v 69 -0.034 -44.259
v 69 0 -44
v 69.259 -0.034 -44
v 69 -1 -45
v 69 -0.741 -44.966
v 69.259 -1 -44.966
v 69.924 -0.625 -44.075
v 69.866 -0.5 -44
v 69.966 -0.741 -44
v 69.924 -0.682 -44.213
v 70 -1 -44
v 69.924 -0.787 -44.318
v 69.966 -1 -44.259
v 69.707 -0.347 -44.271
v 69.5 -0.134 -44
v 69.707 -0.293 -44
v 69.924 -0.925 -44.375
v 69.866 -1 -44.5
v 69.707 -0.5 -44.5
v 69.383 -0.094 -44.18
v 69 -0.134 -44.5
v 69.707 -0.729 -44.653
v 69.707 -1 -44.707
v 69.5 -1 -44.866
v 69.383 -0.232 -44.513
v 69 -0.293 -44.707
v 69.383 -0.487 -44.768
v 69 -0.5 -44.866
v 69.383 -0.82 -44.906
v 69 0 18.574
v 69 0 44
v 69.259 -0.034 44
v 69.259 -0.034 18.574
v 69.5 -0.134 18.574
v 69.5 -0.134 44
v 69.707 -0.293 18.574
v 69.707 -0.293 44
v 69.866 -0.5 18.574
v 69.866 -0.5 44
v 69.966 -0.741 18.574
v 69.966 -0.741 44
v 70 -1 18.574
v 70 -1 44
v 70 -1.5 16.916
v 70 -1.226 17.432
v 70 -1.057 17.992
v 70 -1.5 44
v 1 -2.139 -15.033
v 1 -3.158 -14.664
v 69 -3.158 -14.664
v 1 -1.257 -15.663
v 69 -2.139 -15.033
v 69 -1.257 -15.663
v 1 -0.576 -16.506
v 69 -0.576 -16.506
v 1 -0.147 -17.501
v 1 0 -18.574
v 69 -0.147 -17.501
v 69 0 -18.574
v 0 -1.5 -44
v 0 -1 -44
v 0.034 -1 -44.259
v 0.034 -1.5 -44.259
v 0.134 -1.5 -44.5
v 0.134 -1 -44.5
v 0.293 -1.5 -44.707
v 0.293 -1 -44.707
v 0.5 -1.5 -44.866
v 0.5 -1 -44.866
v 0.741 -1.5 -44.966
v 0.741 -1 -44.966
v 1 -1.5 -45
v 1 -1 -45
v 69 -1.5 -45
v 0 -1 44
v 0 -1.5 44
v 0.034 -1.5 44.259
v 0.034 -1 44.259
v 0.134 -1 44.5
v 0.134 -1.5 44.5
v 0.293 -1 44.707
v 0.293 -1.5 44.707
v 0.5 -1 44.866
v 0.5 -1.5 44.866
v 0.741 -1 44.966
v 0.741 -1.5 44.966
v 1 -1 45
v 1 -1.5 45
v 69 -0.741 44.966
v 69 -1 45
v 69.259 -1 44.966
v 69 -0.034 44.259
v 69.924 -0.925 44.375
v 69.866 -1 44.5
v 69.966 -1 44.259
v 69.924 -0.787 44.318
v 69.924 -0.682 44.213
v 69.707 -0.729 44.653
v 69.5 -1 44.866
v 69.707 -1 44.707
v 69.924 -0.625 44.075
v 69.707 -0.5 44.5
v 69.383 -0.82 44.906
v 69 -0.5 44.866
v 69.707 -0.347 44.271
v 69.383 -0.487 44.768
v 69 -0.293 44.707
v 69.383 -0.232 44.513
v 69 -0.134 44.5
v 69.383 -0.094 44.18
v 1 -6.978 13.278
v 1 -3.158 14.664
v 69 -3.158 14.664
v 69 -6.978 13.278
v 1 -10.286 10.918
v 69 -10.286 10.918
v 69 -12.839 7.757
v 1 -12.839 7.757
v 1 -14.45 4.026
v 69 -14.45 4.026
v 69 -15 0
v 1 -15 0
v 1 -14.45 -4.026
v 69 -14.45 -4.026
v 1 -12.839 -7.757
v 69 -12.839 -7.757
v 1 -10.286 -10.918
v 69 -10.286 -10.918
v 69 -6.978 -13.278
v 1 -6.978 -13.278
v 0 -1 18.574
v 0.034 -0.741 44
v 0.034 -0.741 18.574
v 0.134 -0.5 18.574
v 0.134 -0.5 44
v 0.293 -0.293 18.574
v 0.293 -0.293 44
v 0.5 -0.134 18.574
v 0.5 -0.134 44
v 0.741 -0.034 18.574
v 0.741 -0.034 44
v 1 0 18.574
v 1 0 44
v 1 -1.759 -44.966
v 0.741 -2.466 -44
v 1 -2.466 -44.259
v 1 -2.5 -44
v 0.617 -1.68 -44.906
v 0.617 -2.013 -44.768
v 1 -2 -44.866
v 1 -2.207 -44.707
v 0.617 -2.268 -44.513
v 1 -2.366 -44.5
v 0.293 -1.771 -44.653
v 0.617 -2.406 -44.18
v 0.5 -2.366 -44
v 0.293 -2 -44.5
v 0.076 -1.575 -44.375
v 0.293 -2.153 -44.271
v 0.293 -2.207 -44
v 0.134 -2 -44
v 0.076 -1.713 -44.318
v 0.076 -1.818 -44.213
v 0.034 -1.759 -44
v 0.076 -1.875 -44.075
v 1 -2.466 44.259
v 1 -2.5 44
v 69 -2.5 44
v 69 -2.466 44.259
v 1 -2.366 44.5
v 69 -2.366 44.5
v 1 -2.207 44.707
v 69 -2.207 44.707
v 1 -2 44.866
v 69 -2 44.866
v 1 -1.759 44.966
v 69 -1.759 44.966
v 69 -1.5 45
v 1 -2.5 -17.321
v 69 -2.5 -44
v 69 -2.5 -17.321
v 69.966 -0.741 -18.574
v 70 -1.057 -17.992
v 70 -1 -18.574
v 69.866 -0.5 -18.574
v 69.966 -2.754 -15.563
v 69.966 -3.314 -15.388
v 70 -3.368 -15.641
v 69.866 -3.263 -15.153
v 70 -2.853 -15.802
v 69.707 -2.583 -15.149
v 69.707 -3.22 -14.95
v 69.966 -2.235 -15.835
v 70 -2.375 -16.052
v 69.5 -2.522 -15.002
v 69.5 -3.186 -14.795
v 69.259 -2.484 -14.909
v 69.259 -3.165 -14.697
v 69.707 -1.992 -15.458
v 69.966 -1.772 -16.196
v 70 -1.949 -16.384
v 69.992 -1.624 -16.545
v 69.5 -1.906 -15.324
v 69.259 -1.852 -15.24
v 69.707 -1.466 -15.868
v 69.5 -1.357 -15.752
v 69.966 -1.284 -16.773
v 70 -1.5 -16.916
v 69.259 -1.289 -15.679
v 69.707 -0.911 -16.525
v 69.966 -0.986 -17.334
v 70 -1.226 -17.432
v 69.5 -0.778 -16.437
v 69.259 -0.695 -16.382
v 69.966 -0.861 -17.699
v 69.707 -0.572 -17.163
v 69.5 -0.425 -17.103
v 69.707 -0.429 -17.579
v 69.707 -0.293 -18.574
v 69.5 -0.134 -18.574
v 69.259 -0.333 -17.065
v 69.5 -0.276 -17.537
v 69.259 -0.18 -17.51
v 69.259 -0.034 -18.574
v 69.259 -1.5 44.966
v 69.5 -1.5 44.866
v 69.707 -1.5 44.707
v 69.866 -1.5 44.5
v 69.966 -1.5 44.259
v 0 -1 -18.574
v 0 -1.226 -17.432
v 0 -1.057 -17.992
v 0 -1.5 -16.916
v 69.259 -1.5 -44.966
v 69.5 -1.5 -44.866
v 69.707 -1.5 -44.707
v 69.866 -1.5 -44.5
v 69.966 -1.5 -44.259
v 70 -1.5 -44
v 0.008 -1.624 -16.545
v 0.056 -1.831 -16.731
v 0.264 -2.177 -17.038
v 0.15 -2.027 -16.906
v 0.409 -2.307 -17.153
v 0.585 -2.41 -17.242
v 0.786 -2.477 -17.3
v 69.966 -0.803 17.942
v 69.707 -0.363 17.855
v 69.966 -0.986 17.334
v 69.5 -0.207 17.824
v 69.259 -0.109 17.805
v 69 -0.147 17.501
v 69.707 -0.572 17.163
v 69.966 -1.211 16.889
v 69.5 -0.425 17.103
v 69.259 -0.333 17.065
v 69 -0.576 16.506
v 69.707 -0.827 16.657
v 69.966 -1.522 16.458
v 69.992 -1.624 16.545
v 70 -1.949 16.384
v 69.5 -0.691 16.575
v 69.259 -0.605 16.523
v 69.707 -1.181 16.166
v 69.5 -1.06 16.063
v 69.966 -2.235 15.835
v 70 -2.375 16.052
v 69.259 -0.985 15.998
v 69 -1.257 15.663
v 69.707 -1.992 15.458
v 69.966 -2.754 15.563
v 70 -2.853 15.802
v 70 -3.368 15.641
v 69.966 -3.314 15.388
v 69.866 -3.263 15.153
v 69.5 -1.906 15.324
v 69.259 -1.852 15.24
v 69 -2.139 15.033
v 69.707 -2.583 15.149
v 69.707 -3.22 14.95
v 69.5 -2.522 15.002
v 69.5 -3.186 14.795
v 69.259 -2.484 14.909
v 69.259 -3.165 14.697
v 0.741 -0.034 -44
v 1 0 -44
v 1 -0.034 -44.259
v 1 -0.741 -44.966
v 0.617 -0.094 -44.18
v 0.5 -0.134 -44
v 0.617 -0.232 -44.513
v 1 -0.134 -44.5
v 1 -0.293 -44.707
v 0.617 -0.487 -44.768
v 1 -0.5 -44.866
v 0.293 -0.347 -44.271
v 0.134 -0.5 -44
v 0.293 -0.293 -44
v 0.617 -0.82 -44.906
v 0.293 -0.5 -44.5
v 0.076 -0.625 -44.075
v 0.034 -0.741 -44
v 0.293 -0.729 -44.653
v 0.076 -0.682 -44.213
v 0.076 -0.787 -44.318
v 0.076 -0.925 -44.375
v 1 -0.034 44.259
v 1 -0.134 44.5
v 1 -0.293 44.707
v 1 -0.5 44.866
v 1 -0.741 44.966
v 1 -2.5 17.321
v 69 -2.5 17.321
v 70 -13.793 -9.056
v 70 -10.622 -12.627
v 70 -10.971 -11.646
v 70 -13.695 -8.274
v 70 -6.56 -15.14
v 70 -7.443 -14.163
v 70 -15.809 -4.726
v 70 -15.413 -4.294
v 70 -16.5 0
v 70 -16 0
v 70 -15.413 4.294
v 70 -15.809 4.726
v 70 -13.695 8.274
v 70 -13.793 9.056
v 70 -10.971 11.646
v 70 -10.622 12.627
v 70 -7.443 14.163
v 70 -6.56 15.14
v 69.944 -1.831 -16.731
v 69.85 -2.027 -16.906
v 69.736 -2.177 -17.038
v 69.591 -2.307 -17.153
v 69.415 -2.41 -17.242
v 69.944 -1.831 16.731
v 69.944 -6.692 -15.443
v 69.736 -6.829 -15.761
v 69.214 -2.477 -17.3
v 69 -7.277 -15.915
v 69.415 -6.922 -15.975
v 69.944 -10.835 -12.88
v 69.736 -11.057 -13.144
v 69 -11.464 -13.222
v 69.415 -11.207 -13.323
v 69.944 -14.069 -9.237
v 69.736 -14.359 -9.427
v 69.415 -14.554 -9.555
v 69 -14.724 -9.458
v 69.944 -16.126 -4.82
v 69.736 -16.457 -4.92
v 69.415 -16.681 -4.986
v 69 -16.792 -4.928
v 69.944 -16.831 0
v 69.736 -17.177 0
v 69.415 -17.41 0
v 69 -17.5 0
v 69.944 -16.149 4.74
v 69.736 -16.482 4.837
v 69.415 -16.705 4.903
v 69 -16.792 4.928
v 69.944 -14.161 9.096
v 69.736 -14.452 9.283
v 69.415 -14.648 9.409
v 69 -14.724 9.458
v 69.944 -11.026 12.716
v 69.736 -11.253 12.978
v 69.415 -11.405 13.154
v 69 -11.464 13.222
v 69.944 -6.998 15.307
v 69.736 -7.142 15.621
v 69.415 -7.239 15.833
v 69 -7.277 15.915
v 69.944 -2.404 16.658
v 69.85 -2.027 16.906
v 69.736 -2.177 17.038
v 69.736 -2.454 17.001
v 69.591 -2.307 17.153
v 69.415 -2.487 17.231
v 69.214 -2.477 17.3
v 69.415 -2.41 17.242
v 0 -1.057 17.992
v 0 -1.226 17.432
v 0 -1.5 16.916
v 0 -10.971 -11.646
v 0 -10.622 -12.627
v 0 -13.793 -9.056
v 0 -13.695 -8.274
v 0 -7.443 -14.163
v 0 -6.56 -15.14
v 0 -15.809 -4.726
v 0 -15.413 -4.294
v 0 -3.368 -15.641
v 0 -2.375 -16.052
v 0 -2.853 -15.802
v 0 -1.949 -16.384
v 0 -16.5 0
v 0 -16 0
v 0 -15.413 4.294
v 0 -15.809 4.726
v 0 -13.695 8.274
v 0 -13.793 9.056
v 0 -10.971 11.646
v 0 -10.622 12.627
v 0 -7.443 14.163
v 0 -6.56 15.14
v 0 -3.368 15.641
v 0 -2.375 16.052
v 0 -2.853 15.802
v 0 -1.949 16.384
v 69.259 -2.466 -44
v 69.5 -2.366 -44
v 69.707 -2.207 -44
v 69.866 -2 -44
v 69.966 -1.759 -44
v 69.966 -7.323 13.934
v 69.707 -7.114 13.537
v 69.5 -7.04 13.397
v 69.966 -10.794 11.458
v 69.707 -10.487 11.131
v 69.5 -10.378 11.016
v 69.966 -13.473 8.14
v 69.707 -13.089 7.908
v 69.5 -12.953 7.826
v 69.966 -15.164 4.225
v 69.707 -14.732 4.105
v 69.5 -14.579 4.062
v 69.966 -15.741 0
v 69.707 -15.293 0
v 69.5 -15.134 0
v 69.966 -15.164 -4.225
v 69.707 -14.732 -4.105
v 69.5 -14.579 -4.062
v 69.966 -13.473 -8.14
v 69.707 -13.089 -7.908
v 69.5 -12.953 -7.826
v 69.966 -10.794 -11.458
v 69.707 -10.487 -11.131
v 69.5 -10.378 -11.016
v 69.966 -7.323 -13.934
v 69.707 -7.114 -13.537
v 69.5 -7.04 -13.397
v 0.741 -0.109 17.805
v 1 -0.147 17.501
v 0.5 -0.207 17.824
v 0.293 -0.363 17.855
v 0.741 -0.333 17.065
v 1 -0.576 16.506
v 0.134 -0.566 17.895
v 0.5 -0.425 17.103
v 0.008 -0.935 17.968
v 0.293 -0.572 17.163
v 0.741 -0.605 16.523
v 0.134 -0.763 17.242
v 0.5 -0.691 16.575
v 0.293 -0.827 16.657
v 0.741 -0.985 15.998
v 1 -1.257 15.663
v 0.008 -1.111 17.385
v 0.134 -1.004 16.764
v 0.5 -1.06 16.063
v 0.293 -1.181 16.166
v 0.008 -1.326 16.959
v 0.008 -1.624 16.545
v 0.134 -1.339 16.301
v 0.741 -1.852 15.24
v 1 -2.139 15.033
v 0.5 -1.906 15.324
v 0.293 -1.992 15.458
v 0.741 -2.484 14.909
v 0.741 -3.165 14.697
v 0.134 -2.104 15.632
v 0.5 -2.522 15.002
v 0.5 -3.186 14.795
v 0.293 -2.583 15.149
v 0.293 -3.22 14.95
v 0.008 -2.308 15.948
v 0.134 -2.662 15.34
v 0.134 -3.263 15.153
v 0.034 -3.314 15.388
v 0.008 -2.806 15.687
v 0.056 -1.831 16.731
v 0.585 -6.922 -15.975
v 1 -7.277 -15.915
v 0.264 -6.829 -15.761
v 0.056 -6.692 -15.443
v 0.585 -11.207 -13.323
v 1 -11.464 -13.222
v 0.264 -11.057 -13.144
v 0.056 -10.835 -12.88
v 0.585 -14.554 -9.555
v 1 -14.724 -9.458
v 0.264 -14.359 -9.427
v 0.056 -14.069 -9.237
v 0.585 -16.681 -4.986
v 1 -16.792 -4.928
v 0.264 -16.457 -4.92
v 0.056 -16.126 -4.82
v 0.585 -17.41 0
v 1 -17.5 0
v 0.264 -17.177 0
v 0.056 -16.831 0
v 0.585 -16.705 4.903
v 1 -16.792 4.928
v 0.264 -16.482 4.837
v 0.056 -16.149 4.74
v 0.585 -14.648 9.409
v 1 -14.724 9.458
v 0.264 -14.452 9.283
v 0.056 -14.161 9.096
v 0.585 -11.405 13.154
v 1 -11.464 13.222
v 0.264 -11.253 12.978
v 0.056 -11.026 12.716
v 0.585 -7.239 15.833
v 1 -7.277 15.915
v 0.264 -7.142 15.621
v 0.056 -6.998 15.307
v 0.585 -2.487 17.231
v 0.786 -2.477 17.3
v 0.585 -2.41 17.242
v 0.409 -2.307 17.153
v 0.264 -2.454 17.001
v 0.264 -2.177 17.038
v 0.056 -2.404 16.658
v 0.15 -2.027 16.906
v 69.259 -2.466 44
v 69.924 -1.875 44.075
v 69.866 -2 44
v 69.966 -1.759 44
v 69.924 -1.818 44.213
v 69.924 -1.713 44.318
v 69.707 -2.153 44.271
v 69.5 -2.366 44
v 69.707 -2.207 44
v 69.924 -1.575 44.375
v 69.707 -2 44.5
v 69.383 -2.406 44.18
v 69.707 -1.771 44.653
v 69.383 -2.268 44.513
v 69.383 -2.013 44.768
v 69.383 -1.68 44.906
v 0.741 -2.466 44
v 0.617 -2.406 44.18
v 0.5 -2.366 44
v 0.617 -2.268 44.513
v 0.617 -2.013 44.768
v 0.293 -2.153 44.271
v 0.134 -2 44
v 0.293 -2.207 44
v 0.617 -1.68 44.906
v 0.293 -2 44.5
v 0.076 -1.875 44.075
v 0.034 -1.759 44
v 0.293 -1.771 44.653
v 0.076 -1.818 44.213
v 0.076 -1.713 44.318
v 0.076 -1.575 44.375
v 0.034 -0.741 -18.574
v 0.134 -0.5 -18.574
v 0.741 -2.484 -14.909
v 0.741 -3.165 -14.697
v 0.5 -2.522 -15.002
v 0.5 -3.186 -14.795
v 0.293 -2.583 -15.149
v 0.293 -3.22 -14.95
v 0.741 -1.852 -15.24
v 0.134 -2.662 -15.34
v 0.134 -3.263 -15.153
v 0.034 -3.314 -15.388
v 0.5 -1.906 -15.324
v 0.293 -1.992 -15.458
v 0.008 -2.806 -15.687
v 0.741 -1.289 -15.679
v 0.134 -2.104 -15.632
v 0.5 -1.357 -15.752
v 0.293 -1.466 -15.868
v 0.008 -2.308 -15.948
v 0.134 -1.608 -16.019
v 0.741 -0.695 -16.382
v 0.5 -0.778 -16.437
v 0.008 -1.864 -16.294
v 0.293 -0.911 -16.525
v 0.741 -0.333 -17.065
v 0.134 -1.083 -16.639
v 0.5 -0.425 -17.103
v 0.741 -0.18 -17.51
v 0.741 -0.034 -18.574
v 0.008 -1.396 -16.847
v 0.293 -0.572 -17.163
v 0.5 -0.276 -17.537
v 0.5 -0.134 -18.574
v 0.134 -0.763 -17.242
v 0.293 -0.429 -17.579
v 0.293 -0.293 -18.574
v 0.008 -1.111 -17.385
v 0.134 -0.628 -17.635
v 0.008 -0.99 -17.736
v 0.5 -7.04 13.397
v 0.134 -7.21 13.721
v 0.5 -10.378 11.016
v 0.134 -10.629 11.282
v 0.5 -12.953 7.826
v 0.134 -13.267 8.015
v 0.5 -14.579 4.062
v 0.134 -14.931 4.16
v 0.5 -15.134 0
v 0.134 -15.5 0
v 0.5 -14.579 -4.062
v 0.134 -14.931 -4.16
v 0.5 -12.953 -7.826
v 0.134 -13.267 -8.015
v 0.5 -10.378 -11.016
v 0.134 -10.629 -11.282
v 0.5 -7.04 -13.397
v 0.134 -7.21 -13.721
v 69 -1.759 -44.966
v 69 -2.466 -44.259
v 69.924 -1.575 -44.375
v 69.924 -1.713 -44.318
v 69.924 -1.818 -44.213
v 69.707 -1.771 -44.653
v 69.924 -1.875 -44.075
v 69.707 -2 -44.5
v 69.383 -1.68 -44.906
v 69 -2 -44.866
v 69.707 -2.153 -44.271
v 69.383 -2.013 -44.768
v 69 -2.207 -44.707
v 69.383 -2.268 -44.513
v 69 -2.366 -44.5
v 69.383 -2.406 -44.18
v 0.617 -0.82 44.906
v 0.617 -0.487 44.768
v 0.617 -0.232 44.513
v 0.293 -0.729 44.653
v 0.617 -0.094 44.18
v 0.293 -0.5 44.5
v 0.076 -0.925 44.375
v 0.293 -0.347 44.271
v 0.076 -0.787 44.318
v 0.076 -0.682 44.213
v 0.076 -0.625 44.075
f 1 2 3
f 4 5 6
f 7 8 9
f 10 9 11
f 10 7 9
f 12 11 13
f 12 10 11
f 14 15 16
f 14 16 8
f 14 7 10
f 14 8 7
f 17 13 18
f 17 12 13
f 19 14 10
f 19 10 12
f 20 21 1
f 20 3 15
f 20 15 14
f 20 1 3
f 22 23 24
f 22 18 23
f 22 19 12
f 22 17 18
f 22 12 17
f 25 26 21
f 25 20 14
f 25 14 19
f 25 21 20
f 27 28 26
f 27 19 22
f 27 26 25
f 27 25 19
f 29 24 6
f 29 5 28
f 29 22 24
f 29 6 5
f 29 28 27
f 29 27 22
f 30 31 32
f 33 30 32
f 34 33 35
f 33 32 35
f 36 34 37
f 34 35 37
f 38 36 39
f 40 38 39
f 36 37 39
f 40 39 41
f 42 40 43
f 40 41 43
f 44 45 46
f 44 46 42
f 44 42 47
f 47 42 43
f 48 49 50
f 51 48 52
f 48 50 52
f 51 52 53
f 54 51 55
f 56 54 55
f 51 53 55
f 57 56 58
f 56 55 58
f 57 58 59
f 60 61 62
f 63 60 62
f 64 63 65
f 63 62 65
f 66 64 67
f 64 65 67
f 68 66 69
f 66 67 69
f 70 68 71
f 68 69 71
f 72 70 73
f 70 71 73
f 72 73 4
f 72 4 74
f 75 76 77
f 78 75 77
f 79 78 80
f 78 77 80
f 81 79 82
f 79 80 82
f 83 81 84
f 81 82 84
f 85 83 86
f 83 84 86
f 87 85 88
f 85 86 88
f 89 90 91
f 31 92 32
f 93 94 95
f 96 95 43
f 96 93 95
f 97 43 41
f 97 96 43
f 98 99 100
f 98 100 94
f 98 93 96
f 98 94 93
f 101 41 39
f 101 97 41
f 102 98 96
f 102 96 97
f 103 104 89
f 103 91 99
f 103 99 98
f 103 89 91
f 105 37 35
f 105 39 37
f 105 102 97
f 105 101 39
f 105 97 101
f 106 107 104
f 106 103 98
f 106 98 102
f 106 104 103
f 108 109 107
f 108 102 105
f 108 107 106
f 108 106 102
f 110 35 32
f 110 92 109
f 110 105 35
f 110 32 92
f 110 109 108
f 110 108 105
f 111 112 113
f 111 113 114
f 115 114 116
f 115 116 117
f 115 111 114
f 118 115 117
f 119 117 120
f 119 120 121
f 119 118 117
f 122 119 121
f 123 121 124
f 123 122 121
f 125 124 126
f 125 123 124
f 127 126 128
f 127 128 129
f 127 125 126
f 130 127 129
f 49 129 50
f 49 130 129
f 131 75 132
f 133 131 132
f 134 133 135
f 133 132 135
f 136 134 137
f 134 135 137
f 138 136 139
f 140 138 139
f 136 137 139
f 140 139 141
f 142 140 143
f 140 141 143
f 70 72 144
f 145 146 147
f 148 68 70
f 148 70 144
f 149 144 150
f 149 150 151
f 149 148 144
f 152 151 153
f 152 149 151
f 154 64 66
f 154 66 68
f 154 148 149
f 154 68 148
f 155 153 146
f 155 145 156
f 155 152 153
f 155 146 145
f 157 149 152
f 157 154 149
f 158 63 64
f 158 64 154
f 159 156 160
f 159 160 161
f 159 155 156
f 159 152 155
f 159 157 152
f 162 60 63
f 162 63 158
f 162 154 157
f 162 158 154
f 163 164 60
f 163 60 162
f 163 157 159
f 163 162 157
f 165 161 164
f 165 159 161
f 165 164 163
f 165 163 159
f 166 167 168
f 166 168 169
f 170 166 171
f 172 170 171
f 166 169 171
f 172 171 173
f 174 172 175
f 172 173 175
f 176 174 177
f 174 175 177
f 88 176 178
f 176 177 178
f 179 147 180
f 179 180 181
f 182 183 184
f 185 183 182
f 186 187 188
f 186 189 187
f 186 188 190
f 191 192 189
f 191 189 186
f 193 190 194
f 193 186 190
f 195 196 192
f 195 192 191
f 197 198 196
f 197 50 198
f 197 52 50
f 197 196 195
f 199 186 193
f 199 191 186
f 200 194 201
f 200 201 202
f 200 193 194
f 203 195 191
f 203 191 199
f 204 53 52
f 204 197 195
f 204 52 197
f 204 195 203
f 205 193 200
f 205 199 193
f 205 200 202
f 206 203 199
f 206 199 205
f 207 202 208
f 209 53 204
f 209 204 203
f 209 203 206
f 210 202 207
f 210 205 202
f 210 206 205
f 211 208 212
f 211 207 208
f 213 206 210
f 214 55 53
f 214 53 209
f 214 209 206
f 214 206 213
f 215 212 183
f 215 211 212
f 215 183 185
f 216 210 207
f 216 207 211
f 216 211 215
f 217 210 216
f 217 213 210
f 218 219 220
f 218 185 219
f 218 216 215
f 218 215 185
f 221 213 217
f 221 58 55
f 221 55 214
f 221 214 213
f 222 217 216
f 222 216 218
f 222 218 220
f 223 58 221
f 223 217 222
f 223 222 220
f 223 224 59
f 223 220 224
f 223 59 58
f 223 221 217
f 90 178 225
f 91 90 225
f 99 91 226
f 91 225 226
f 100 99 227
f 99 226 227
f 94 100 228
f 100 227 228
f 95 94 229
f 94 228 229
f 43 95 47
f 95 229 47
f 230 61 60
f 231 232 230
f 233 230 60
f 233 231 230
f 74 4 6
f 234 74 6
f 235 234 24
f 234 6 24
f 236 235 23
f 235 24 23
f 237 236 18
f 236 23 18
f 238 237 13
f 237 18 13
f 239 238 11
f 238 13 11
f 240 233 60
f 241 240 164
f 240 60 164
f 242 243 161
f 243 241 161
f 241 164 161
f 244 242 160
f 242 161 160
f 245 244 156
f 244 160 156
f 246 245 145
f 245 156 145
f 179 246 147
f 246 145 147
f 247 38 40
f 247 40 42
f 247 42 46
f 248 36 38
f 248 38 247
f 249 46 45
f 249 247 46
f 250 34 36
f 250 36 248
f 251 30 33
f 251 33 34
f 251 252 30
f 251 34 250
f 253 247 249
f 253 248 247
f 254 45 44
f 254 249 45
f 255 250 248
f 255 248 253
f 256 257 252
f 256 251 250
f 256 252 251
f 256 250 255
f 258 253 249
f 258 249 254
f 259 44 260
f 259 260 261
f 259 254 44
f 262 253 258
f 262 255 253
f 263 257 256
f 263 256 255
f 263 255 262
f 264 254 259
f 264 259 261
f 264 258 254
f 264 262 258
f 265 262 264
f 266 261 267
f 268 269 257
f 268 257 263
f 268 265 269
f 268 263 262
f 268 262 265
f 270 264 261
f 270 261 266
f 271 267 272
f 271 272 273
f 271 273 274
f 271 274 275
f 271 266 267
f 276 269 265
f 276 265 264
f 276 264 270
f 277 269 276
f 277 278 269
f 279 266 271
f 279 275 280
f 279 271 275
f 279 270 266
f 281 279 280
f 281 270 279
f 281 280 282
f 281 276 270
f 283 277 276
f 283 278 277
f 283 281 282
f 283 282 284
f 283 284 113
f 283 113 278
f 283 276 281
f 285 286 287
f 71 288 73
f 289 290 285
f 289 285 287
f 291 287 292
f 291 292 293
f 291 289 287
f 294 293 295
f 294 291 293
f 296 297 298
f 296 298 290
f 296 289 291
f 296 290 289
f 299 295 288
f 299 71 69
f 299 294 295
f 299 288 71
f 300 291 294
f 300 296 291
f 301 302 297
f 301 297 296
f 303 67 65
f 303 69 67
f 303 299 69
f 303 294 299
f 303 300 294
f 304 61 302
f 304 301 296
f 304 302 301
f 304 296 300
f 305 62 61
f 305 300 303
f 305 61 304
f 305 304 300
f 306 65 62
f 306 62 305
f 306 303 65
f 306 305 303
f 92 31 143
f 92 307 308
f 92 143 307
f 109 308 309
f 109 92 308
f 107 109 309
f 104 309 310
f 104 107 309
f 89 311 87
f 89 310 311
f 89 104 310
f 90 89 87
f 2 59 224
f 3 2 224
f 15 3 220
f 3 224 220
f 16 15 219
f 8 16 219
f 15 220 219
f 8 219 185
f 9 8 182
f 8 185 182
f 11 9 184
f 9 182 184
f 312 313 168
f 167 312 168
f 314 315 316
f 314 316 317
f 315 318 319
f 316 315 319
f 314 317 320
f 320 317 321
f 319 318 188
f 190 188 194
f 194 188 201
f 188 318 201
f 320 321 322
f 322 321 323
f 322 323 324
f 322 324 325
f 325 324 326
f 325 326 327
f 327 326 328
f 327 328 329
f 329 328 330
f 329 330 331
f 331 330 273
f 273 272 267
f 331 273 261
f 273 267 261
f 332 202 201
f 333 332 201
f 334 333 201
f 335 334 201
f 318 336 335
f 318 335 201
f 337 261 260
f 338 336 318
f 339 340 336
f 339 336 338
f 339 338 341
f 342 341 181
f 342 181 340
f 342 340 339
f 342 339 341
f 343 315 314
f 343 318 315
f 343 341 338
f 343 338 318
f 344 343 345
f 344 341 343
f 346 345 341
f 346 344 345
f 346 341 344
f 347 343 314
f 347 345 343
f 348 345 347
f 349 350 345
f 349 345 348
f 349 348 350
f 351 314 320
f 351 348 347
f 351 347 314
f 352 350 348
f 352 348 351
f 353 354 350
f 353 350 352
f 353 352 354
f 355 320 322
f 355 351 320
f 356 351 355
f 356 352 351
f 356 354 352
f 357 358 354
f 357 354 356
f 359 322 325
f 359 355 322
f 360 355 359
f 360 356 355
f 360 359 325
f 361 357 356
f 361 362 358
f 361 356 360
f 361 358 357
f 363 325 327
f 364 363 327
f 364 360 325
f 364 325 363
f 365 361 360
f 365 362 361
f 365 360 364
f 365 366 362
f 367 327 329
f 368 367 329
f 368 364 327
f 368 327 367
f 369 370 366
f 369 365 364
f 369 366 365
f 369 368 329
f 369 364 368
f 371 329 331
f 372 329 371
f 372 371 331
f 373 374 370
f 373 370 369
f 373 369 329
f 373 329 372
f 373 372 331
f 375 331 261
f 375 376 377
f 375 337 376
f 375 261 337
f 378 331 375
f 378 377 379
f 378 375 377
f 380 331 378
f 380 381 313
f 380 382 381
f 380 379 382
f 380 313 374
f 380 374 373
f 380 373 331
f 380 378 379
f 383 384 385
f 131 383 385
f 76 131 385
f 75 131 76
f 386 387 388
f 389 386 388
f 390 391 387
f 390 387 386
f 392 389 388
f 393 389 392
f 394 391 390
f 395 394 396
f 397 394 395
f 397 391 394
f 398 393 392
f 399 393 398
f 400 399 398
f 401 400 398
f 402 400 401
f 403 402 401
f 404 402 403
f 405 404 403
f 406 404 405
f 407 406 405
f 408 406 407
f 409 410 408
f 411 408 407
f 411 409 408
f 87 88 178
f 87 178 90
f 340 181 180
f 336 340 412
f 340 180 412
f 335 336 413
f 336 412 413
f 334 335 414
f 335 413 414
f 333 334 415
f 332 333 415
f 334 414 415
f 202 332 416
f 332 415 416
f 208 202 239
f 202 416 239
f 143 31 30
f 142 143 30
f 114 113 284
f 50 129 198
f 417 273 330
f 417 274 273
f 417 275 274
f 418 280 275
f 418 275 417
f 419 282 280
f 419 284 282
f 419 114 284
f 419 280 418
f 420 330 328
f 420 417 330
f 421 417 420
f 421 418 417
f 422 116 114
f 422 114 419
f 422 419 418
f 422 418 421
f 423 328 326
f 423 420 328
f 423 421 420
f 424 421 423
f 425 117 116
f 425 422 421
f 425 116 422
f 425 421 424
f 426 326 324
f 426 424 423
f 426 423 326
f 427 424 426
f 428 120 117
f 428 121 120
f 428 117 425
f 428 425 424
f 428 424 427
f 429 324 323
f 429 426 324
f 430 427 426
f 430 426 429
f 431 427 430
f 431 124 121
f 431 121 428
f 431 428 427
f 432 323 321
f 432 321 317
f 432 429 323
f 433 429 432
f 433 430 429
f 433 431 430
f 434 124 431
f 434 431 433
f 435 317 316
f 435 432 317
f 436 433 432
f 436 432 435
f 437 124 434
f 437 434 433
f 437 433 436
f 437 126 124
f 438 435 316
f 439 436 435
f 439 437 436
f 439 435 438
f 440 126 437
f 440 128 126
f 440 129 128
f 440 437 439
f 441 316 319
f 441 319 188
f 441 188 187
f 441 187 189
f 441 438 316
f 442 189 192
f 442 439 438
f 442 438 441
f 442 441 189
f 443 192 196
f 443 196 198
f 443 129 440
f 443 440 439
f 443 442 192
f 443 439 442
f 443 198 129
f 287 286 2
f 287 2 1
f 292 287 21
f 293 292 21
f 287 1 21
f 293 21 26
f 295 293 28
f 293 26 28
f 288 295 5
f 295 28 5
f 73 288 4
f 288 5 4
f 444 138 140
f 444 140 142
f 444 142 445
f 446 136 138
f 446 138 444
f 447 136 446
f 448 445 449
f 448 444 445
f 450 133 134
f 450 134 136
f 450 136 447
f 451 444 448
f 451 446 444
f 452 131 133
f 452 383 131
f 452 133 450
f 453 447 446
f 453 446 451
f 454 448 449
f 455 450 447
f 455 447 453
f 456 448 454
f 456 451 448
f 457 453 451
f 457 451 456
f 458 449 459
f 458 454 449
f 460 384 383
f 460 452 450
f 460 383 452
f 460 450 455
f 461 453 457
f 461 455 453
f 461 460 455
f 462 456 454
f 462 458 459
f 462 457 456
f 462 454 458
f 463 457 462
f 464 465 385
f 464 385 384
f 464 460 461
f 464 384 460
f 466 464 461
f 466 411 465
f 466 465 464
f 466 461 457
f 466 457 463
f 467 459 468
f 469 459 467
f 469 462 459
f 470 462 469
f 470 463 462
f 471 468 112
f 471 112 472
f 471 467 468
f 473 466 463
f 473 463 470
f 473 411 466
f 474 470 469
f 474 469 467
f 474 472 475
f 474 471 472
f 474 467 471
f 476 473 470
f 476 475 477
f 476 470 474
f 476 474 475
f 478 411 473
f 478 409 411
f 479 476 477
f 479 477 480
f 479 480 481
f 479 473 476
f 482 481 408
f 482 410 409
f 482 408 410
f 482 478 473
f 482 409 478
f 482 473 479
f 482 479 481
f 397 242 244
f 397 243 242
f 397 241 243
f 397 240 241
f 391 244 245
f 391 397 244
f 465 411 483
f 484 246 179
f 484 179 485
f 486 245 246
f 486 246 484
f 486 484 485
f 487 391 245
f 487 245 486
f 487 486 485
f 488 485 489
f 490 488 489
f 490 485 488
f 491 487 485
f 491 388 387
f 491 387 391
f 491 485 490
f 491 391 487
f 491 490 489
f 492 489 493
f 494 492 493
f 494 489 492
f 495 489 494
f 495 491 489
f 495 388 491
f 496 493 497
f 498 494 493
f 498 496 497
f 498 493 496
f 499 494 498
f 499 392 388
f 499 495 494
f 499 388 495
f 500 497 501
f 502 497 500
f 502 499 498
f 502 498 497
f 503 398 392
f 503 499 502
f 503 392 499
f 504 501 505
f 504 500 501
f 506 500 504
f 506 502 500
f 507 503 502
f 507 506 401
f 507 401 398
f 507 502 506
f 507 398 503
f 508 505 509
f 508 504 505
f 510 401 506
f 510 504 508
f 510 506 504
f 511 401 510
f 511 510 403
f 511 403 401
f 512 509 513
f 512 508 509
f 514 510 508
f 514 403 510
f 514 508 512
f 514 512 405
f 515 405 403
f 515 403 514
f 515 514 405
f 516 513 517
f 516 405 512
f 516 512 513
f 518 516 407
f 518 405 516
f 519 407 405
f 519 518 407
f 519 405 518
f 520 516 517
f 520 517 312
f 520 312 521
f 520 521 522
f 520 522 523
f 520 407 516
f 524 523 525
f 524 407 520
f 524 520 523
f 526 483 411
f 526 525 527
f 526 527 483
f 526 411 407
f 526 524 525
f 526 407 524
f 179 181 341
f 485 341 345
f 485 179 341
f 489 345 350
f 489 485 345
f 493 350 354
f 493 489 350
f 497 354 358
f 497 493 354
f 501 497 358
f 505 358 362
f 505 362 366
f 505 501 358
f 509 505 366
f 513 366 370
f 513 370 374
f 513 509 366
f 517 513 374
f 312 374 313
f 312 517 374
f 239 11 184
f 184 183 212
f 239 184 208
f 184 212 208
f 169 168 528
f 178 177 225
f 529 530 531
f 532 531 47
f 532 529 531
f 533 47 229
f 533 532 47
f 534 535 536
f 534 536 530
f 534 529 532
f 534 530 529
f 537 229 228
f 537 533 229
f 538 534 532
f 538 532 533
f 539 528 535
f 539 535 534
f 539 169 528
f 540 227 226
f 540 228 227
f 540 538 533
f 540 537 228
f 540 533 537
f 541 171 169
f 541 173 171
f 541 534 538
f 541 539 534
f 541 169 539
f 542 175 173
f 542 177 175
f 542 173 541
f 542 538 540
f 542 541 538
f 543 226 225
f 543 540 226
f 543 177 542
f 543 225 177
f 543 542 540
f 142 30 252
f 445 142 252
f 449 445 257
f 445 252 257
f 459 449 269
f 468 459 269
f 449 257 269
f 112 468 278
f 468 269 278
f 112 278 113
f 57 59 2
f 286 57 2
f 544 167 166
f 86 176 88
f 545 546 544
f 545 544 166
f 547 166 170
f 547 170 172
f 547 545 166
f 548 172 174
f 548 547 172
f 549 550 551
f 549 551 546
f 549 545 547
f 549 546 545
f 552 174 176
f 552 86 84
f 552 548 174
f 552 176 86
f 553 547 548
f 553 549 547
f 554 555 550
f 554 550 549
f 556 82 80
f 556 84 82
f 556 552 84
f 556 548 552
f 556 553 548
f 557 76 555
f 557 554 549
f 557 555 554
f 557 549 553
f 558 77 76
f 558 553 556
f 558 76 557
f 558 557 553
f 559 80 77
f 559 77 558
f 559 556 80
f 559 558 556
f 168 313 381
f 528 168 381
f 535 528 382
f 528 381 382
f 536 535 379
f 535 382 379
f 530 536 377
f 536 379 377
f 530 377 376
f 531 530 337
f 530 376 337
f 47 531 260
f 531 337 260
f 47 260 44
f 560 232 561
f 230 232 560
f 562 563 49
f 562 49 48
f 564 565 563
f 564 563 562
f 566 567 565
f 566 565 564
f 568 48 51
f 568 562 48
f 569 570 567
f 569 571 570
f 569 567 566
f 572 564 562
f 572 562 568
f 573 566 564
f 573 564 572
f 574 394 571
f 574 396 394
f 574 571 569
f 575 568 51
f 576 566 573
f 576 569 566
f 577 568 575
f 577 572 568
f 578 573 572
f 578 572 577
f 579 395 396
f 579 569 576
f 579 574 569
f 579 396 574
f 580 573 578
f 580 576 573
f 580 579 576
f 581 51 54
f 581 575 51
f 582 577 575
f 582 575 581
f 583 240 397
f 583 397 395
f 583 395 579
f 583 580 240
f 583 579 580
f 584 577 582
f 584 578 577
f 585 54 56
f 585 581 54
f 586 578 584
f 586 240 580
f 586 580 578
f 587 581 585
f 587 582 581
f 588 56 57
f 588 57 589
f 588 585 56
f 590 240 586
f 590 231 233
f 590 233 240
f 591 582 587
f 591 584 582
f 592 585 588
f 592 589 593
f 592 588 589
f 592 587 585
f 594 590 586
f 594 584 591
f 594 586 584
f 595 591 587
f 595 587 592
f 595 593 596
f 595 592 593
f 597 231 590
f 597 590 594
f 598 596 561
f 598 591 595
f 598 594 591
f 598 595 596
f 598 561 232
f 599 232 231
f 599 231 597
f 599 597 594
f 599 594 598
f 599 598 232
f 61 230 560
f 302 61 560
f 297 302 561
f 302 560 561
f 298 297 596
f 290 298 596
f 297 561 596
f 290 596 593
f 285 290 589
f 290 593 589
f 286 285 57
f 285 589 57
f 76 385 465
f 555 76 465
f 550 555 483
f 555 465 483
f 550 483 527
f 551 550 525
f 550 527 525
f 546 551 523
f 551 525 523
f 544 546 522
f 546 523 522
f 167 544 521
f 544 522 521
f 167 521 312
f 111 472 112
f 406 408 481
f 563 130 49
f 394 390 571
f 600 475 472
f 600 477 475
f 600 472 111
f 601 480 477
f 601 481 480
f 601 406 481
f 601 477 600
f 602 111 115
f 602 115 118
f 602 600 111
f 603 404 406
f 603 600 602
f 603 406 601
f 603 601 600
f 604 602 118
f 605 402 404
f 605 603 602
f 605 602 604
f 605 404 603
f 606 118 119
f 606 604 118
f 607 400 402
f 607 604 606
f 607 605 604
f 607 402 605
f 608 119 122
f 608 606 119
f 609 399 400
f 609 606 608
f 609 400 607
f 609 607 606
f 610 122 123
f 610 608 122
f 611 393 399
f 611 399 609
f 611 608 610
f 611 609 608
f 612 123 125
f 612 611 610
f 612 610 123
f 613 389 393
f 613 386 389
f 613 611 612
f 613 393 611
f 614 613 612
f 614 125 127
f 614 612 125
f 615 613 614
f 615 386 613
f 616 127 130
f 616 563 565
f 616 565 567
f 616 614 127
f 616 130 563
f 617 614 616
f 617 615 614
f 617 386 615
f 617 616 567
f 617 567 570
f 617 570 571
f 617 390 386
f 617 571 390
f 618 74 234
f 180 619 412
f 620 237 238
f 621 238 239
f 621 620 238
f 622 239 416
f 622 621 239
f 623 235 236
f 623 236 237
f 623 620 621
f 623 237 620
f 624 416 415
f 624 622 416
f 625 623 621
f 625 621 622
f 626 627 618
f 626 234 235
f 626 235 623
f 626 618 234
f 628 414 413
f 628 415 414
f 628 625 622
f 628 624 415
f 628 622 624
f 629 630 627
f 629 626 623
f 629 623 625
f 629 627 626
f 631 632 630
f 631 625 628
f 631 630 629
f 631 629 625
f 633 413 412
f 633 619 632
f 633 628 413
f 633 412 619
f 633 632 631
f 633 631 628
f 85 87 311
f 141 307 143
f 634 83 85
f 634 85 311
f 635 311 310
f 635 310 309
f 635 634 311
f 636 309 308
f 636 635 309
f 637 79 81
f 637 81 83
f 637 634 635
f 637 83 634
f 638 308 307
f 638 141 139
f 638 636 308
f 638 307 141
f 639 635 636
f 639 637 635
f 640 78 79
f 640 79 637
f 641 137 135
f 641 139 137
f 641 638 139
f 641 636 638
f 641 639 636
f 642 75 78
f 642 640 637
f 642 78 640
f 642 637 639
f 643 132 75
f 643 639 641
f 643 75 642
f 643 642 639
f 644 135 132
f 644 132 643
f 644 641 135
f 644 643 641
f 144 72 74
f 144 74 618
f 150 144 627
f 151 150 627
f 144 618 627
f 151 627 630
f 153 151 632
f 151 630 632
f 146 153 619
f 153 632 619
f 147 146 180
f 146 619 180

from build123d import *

# Parameters (mm, degrees)
BOSS_EXTRUDE1_DEPTH = 70
FILLET1_R           = 1
FILLET2_R           = 4
FILLET3_R           = 1


with BuildPart() as part:
    # Sketch1 → Boss-Extrude1 (new body)
    with BuildSketch(Plane(origin=(0, 0, 0), x_dir=(0, 0, -1), z_dir=(1, 0, 0))):
        with BuildLine():
            Line((-45, 0), (-15, 0))
            ThreePointArc((-15, 0), (0, -15), (15, 0))
            Line((15, 0), (45, 0))
            Line((45, 0), (45, -2.5))
            Line((45, -2.5), (17.320508076, -2.5))
            ThreePointArc((17.320508076, -2.5), (0, -17.5), (-17.320508076, -2.5))
            Line((-17.320508076, -2.5), (-45, -2.5))
            Line((-45, -2.5), (-45, 0))
        make_face()
    extrude(amount=BOSS_EXTRUDE1_DEPTH)

    # Fillet1
    fillet1_edges = [part.edges().sort_by_distance(p)[0] for p in [
        (35, 0, -45),
        (35, -2.5, -45),
        (35, -2.5, 45),
        (35, 0, 45),
    ]]
    fillet(fillet1_edges, radius=FILLET1_R)

    # Fillet2
    fillet2_edges = [part.edges().sort_by_distance(p)[0] for p in [
        (35, 0, -15),
        (35, 0, 15),
    ]]
    fillet(fillet2_edges, radius=FILLET2_R)

    # Fillet3
    # the kernel refuses this fillet: 1 mm, written as the material it takes off along each edge
    with BuildSketch(Plane(origin=(70, 0, 0), x_dir=(0, -0.0003007400627751114, -0.9999999547777063), z_dir=(0, 0.9999999547777063, -0.0003007400627751114))) as fillet3_piece_1_section:
        with BuildLine():
            CenterArc((17.5 - FILLET3_R, FILLET3_R), FILLET3_R, 270, 90)
            Line((17.5 - FILLET3_R, 0), (17.5, 0))
            Line((17.5, 0), (17.5, FILLET3_R))
        make_face()
    fillet3_piece_1 = revolve(axis=Axis((70, 0, 0), (-1, 0, 0)), revolution_arc=179.965537727, mode=Mode.PRIVATE)
    fillet3_piece_1 = split(fillet3_piece_1, bisect_by=Plane(origin=(70, -2.5, 0), z_dir=(0, -1, 0)), keep=Keep.TOP, mode=Mode.PRIVATE)
    add(fillet3_piece_1, mode=Mode.SUBTRACT)
    with BuildSketch(Plane(origin=(70, -2.5, -44), x_dir=(-1, 0, 0), z_dir=(0, 0, 1))) as fillet3_piece_2_section:
        with BuildLine():
            CenterArc((FILLET3_R, -FILLET3_R), FILLET3_R, 90, 90)
            Line((0, -FILLET3_R), (0, 0))
            Line((0, 0), (FILLET3_R, 0))
        make_face()
    fillet3_piece_2 = extrude(amount=29.179491924, mode=Mode.PRIVATE)
    fillet3_piece_2 = fillet3_piece_2 - Plane(origin=(70, 0, 0), x_dir=(0, -0.14285714285714307, -0.989743318610787), z_dir=(-1, 0, 0)) * Cylinder(17.5, 63, mode=Mode.PRIVATE)
    add(fillet3_piece_2, mode=Mode.SUBTRACT)
    with BuildSketch(Plane(origin=(0, -1, -45), x_dir=(0, 0, 1), z_dir=(0, -1, 0)), Plane(origin=(70, -1, -45), x_dir=(-1, 0, 0), z_dir=(0, -1, 0)), Plane(origin=(0, -1.5, 45), x_dir=(0, 0, -1), z_dir=(0, 1, 0)), Plane(origin=(70, -1.5, 45), x_dir=(-1, 0, 0), z_dir=(0, 1, 0))) as fillet3_piece_3:
        with BuildLine():
            CenterArc((FILLET3_R, -FILLET3_R), FILLET3_R, 90, 90)
            Line((0, -FILLET3_R), (0, 0))
            Line((0, 0), (FILLET3_R, 0))
        make_face()
    extrude(amount=0.5, mode=Mode.SUBTRACT)
    with BuildSketch(Plane(origin=(0, 0, -18.574175621), x_dir=(0, -1, 0), z_dir=(0, 0, -1)), Plane(origin=(70, 0, -18.574175621), x_dir=(-1, 0, 0), z_dir=(0, 0, -1)), Plane(origin=(0, 0, 44), x_dir=(0, -1, 0), z_dir=(0, 0, -1)), Plane(origin=(70, 0, 44), x_dir=(-1, 0, 0), z_dir=(0, 0, -1))) as fillet3_piece_4:
        with BuildLine():
            CenterArc((FILLET3_R, -FILLET3_R), FILLET3_R, 90, 90)
            Line((0, -FILLET3_R), (0, 0))
            Line((0, 0), (FILLET3_R, 0))
        make_face()
    extrude(amount=25.425824379, mode=Mode.SUBTRACT)
    with BuildSketch(Plane(origin=(0, -2.5, 14.820508076), x_dir=(0, 1, 0), z_dir=(0, 0, 1))) as fillet3_piece_5_section:
        with BuildLine():
            CenterArc((FILLET3_R, -FILLET3_R), FILLET3_R, 90, 90)
            Line((0, -FILLET3_R), (0, 0))
            Line((0, 0), (FILLET3_R, 0))
        make_face()
    fillet3_piece_5 = extrude(amount=29.179491924, mode=Mode.PRIVATE)
    fillet3_piece_5 = fillet3_piece_5 - Plane(origin=(0, 0, 0), x_dir=(0, -0.14285714285714307, -0.989743318610787), z_dir=(-1, 0, 0)) * Cylinder(17.5, 63, mode=Mode.PRIVATE)
    add(fillet3_piece_5, mode=Mode.SUBTRACT)
    with BuildSketch(Plane(origin=(0, -1, 44), x_dir=(0, 0, 1), z_dir=(0, -1, 0))) as fillet3_piece_6:
        with BuildLine():
            CenterArc((1 - FILLET3_R, -FILLET3_R), FILLET3_R, 0, 90)
            Line((1, -FILLET3_R), (1, 0))
            Line((1, 0), (1 - FILLET3_R, 0))
        make_face()
    revolve(axis=Axis((0, -1, 44), (-1, 0, 0)), revolution_arc=90, mode=Mode.SUBTRACT)
    with BuildSketch(Plane(origin=(0, -1.5, 44), x_dir=(0, -1, 0), z_dir=(0, 0, -1))) as fillet3_piece_7:
        with BuildLine():
            CenterArc((1 - FILLET3_R, -FILLET3_R), FILLET3_R, 0, 90)
            Line((1, -FILLET3_R), (1, 0))
            Line((1, 0), (1 - FILLET3_R, 0))
        make_face()
    revolve(axis=Axis((0, -1.5, 44), (-1, 0, 0)), revolution_arc=90, mode=Mode.SUBTRACT)
    with BuildSketch(Plane(origin=(0, -1, -44), x_dir=(0, 1, 0), z_dir=(0, 0, 1))) as fillet3_piece_8:
        with BuildLine():
            CenterArc((1 - FILLET3_R, -FILLET3_R), FILLET3_R, 0, 90)
            Line((1, -FILLET3_R), (1, 0))
            Line((1, 0), (1 - FILLET3_R, 0))
        make_face()
    revolve(axis=Axis((0, -1, -44), (-1, 0, 0)), revolution_arc=90, mode=Mode.SUBTRACT)
    with BuildSketch(Plane(origin=(0, -1.5, -44), x_dir=(0, 0, -1), z_dir=(0, 1, 0))) as fillet3_piece_9:
        with BuildLine():
            CenterArc((1 - FILLET3_R, -FILLET3_R), FILLET3_R, 0, 90)
            Line((1, -FILLET3_R), (1, 0))
            Line((1, 0), (1 - FILLET3_R, 0))
        make_face()
    revolve(axis=Axis((0, -1.5, -44), (-1, 0, 0)), revolution_arc=90, mode=Mode.SUBTRACT)
    with BuildSketch(Plane(origin=(70, -2.5, 14.820508076), x_dir=(-1, 0, 0), z_dir=(0, 0, 1))) as fillet3_piece_10_section:
        with BuildLine():
            CenterArc((FILLET3_R, -FILLET3_R), FILLET3_R, 90, 90)
            Line((0, -FILLET3_R), (0, 0))
            Line((0, 0), (FILLET3_R, 0))
        make_face()
    fillet3_piece_10 = extrude(amount=29.179491924, mode=Mode.PRIVATE)
    fillet3_piece_10 = fillet3_piece_10 - Plane(origin=(70, 0, 0), x_dir=(0, -0.14285714285714307, -0.989743318610787), z_dir=(-1, 0, 0)) * Cylinder(17.5, 63, mode=Mode.PRIVATE)
    add(fillet3_piece_10, mode=Mode.SUBTRACT)
    with BuildSketch(Plane(origin=(70, -1, 44), x_dir=(0, 0, 1), z_dir=(0, -1, 0))) as fillet3_piece_11:
        with BuildLine():
            CenterArc((1 - FILLET3_R, FILLET3_R), FILLET3_R, 270, 90)
            Line((1 - FILLET3_R, 0), (1, 0))
            Line((1, 0), (1, FILLET3_R))
        make_face()
    revolve(axis=Axis((70, -1, 44), (-1, 0, 0)), revolution_arc=90, mode=Mode.SUBTRACT)
    with BuildSketch(Plane(origin=(70, -1.5, 44), x_dir=(0, -1, 0), z_dir=(0, 0, -1))) as fillet3_piece_12:
        with BuildLine():
            CenterArc((1 - FILLET3_R, FILLET3_R), FILLET3_R, 270, 90)
            Line((1 - FILLET3_R, 0), (1, 0))
            Line((1, 0), (1, FILLET3_R))
        make_face()
    revolve(axis=Axis((70, -1.5, 44), (-1, 0, 0)), revolution_arc=90, mode=Mode.SUBTRACT)
    with BuildSketch(Plane(origin=(70, -1, -44), x_dir=(0, 1, 0), z_dir=(0, 0, 1))) as fillet3_piece_13:
        with BuildLine():
            CenterArc((1 - FILLET3_R, FILLET3_R), FILLET3_R, 270, 90)
            Line((1 - FILLET3_R, 0), (1, 0))
            Line((1, 0), (1, FILLET3_R))
        make_face()
    revolve(axis=Axis((70, -1, -44), (-1, 0, 0)), revolution_arc=90, mode=Mode.SUBTRACT)
    with BuildSketch(Plane(origin=(70, -1.5, -44), x_dir=(0, 0, -1), z_dir=(0, 1, 0))) as fillet3_piece_14:
        with BuildLine():
            CenterArc((1 - FILLET3_R, FILLET3_R), FILLET3_R, 270, 90)
            Line((1 - FILLET3_R, 0), (1, 0))
            Line((1, 0), (1, FILLET3_R))
        make_face()
    revolve(axis=Axis((70, -1.5, -44), (-1, 0, 0)), revolution_arc=90, mode=Mode.SUBTRACT)
    with BuildSketch(Plane(origin=(0, 0, 0), x_dir=(0, -0.21052631578947376, 0.9775881905793005), z_dir=(0, 0.9775881905793005, 0.21052631578947376))) as fillet3_piece_15:
        with BuildLine():
            CenterArc((15 + FILLET3_R, FILLET3_R), FILLET3_R, 180, 90)
            Line((15, FILLET3_R), (15, 0))
            Line((15, 0), (15 + FILLET3_R, 0))
        make_face()
    revolve(axis=Axis((0, 0, 0), (1, 0, 0)), revolution_arc=155.693605062, mode=Mode.SUBTRACT)
    with BuildSketch(Plane(origin=(70, 0, 0), x_dir=(0, -0.21052631578947376, 0.9775881905793005), z_dir=(0, 0.9775881905793005, 0.21052631578947376))) as fillet3_piece_16:
        with BuildLine():
            CenterArc((15 + FILLET3_R, -FILLET3_R), FILLET3_R, 90, 90)
            Line((15 + FILLET3_R, 0), (15, 0))
            Line((15, 0), (15, -FILLET3_R))
        make_face()
    revolve(axis=Axis((70, 0, 0), (1, 0, 0)), revolution_arc=155.693605062, mode=Mode.SUBTRACT)
    with BuildSketch(Plane(origin=(0, -4, 18.574175621), x_dir=(0, 1, 0), z_dir=(0, 0, 1))) as fillet3_piece_17:
        with BuildLine():
            CenterArc((4 - FILLET3_R, -FILLET3_R), FILLET3_R, 0, 90)
            Line((4, -FILLET3_R), (4, 0))
            Line((4, 0), (4 - FILLET3_R, 0))
        make_face()
    revolve(axis=Axis((0, -4, 18.574175621), (-1, 0, 0)), revolution_arc=77.846802531, mode=Mode.SUBTRACT)
    with BuildSketch(Plane(origin=(0, -4, -18.574175621), x_dir=(0, 0.21052631578947345, 0.9775881905793007), z_dir=(0, -0.9775881905793007, 0.21052631578947345))) as fillet3_piece_18:
        with BuildLine():
            CenterArc((4 - FILLET3_R, -FILLET3_R), FILLET3_R, 0, 90)
            Line((4, -FILLET3_R), (4, 0))
            Line((4, 0), (4 - FILLET3_R, 0))
        make_face()
    revolve(axis=Axis((0, -4, -18.574175621), (-1, 0, 0)), revolution_arc=77.846802531, mode=Mode.SUBTRACT)
    with BuildSketch(Plane(origin=(70, -4, 18.574175621), x_dir=(0, 1, 0), z_dir=(0, 0, 1))) as fillet3_piece_19:
        with BuildLine():
            CenterArc((4 - FILLET3_R, FILLET3_R), FILLET3_R, 270, 90)
            Line((4 - FILLET3_R, 0), (4, 0))
            Line((4, 0), (4, FILLET3_R))
        make_face()
    revolve(axis=Axis((70, -4, 18.574175621), (-1, 0, 0)), revolution_arc=77.846802531, mode=Mode.SUBTRACT)
    with BuildSketch(Plane(origin=(70, -4, -18.574175621), x_dir=(0, 0.21052631578947345, 0.9775881905793007), z_dir=(0, -0.9775881905793007, 0.21052631578947345))) as fillet3_piece_20:
        with BuildLine():
            CenterArc((4 - FILLET3_R, FILLET3_R), FILLET3_R, 270, 90)
            Line((4 - FILLET3_R, 0), (4, 0))
            Line((4, 0), (4, FILLET3_R))
        make_face()
    revolve(axis=Axis((70, -4, -18.574175621), (-1, 0, 0)), revolution_arc=77.846802531, mode=Mode.SUBTRACT)
    with BuildSketch(Plane(origin=(0, -2.5, -44), x_dir=(0, 1, 0), z_dir=(0, 0, 1))) as fillet3_piece_21_section:
        with BuildLine():
            CenterArc((FILLET3_R, -FILLET3_R), FILLET3_R, 90, 90)
            Line((0, -FILLET3_R), (0, 0))
            Line((0, 0), (FILLET3_R, 0))
        make_face()
    fillet3_piece_21 = extrude(amount=29.179491924, mode=Mode.PRIVATE)
    fillet3_piece_21 = fillet3_piece_21 - Plane(origin=(0, 0, 0), x_dir=(0, -0.14285714285714307, -0.989743318610787), z_dir=(-1, 0, 0)) * Cylinder(17.5, 63, mode=Mode.PRIVATE)
    add(fillet3_piece_21, mode=Mode.SUBTRACT)
    with BuildSketch(Plane(origin=(0, 0, 0), x_dir=(0, -0.0003007400627751114, -0.9999999547777063), z_dir=(0, 0.9999999547777063, -0.0003007400627751114))) as fillet3_piece_22_section:
        with BuildLine():
            CenterArc((17.5 - FILLET3_R, -FILLET3_R), FILLET3_R, 0, 90)
            Line((17.5, -FILLET3_R), (17.5, 0))
            Line((17.5, 0), (17.5 - FILLET3_R, 0))
        make_face()
    fillet3_piece_22 = revolve(axis=Axis((0, 0, 0), (-1, 0, 0)), revolution_arc=179.965537727, mode=Mode.PRIVATE)
    fillet3_piece_22 = split(fillet3_piece_22, bisect_by=Plane(origin=(0, -2.5, 0), z_dir=(0, -1, 0)), keep=Keep.TOP, mode=Mode.PRIVATE)
    add(fillet3_piece_22, mode=Mode.SUBTRACT)
    with BuildSketch(Plane(origin=(70, 0, 0), x_dir=(0, -0.0003007400627751114, -0.9999999547777063), z_dir=(0, 0.9999999547777063, -0.0003007400627751114))) as fillet3_piece_23a_section:
        with BuildLine():
            CenterArc((17.5 - FILLET3_R, FILLET3_R), FILLET3_R, 270, 90)
            Line((17.5 - FILLET3_R, 0), (17.5, 0))
            Line((17.5, 0), (17.5, FILLET3_R))
        make_face()
    fillet3_piece_23a = revolve(axis=Axis((70, 0, 0), (-1, 0, 0)), revolution_arc=179.965537727, mode=Mode.PRIVATE)
    fillet3_piece_23a = fillet3_piece_23a & Plane(origin=(70, -4, -18.574175621), x_dir=(0, 0.21052631578947353, 0.9775881905793006), z_dir=(1, 0, 0)) * Cylinder(4, 70, mode=Mode.PRIVATE)
    fillet3_piece_23a = split(fillet3_piece_23a, bisect_by=Plane(origin=(70, -2.5, 0), z_dir=(0, 1, 0)), keep=Keep.TOP, mode=Mode.PRIVATE)
    with BuildSketch(Plane(origin=(70, -2.5, -44), x_dir=(-1, 0, 0), z_dir=(0, 0, 1))) as fillet3_piece_23b_section:
        with BuildLine():
            CenterArc((FILLET3_R, -FILLET3_R), FILLET3_R, 90, 90)
            Line((0, -FILLET3_R), (0, 0))
            Line((0, 0), (FILLET3_R, 0))
        make_face()
    fillet3_piece_23b = extrude(amount=29.179491924, mode=Mode.PRIVATE)
    fillet3_piece_23b = fillet3_piece_23b & Plane(origin=(70, -4, -18.574175621), x_dir=(0, 0.21052631578947353, 0.9775881905793006), z_dir=(1, 0, 0)) * Cylinder(4, 63, mode=Mode.PRIVATE)
    fillet3_piece_23b = fillet3_piece_23b & Plane(origin=(70, 0, 0), x_dir=(0, -0.14285714285714307, -0.989743318610787), z_dir=(-1, 0, 0)) * Cylinder(17.5, 63, mode=Mode.PRIVATE)
    fillet3_piece_23 = fillet3_piece_23a & fillet3_piece_23b
    add(fillet3_piece_23, mode=Mode.SUBTRACT)
    with BuildSketch(Plane(origin=(70, -2.5, 14.820508076), x_dir=(-1, 0, 0), z_dir=(0, 0, 1))) as fillet3_piece_24a_section:
        with BuildLine():
            CenterArc((FILLET3_R, -FILLET3_R), FILLET3_R, 90, 90)
            Line((0, -FILLET3_R), (0, 0))
            Line((0, 0), (FILLET3_R, 0))
        make_face()
    fillet3_piece_24a = extrude(amount=29.179491924, mode=Mode.PRIVATE)
    fillet3_piece_24a = fillet3_piece_24a & Plane(origin=(70, -4, 18.574175621), x_dir=(0, 1, 0), z_dir=(1, 0, 0)) * Cylinder(4, 63, mode=Mode.PRIVATE)
    fillet3_piece_24a = fillet3_piece_24a & Plane(origin=(70, 0, 0), x_dir=(0, -0.14285714285714307, -0.989743318610787), z_dir=(-1, 0, 0)) * Cylinder(17.5, 63, mode=Mode.PRIVATE)
    with BuildSketch(Plane(origin=(70, 0, 0), x_dir=(0, -0.0003007400627751114, -0.9999999547777063), z_dir=(0, 0.9999999547777063, -0.0003007400627751114))) as fillet3_piece_24b_section:
        with BuildLine():
            CenterArc((17.5 - FILLET3_R, FILLET3_R), FILLET3_R, 270, 90)
            Line((17.5 - FILLET3_R, 0), (17.5, 0))
            Line((17.5, 0), (17.5, FILLET3_R))
        make_face()
    fillet3_piece_24b = revolve(axis=Axis((70, 0, 0), (-1, 0, 0)), revolution_arc=179.965537727, mode=Mode.PRIVATE)
    fillet3_piece_24b = fillet3_piece_24b & Plane(origin=(70, -4, 18.574175621), x_dir=(0, 1, 0), z_dir=(1, 0, 0)) * Cylinder(4, 70, mode=Mode.PRIVATE)
    fillet3_piece_24b = split(fillet3_piece_24b, bisect_by=Plane(origin=(70, -2.5, 0), z_dir=(0, 1, 0)), keep=Keep.TOP, mode=Mode.PRIVATE)
    fillet3_piece_24 = fillet3_piece_24a & fillet3_piece_24b
    add(fillet3_piece_24, mode=Mode.SUBTRACT)
    with BuildSketch(Plane(origin=(0, -2.5, 14.820508076), x_dir=(0, 1, 0), z_dir=(0, 0, 1))) as fillet3_piece_25a_section:
        with BuildLine():
            CenterArc((FILLET3_R, -FILLET3_R), FILLET3_R, 90, 90)
            Line((0, -FILLET3_R), (0, 0))
            Line((0, 0), (FILLET3_R, 0))
        make_face()
    fillet3_piece_25a = extrude(amount=29.179491924, mode=Mode.PRIVATE)
    fillet3_piece_25a = fillet3_piece_25a & Plane(origin=(0, -4, 18.574175621), x_dir=(0, 1, 0), z_dir=(1, 0, 0)) * Cylinder(4, 63, mode=Mode.PRIVATE)
    fillet3_piece_25a = fillet3_piece_25a & Plane(origin=(0, 0, 0), x_dir=(0, -0.14285714285714307, -0.989743318610787), z_dir=(-1, 0, 0)) * Cylinder(17.5, 63, mode=Mode.PRIVATE)
    with BuildSketch(Plane(origin=(0, 0, 0), x_dir=(0, -0.0003007400627751114, -0.9999999547777063), z_dir=(0, 0.9999999547777063, -0.0003007400627751114))) as fillet3_piece_25b_section:
        with BuildLine():
            CenterArc((17.5 - FILLET3_R, -FILLET3_R), FILLET3_R, 0, 90)
            Line((17.5, -FILLET3_R), (17.5, 0))
            Line((17.5, 0), (17.5 - FILLET3_R, 0))
        make_face()
    fillet3_piece_25b = revolve(axis=Axis((0, 0, 0), (-1, 0, 0)), revolution_arc=179.965537727, mode=Mode.PRIVATE)
    fillet3_piece_25b = fillet3_piece_25b & Plane(origin=(0, -4, 18.574175621), x_dir=(0, 1, 0), z_dir=(1, 0, 0)) * Cylinder(4, 70, mode=Mode.PRIVATE)
    fillet3_piece_25b = split(fillet3_piece_25b, bisect_by=Plane(origin=(0, -2.5, 0), z_dir=(0, 1, 0)), keep=Keep.TOP, mode=Mode.PRIVATE)
    fillet3_piece_25 = fillet3_piece_25a & fillet3_piece_25b
    add(fillet3_piece_25, mode=Mode.SUBTRACT)
    with BuildSketch(Plane(origin=(0, 0, 0), x_dir=(0, -0.0003007400627751114, -0.9999999547777063), z_dir=(0, 0.9999999547777063, -0.0003007400627751114))) as fillet3_piece_26a_section:
        with BuildLine():
            CenterArc((17.5 - FILLET3_R, -FILLET3_R), FILLET3_R, 0, 90)
            Line((17.5, -FILLET3_R), (17.5, 0))
            Line((17.5, 0), (17.5 - FILLET3_R, 0))
        make_face()
    fillet3_piece_26a = revolve(axis=Axis((0, 0, 0), (-1, 0, 0)), revolution_arc=179.965537727, mode=Mode.PRIVATE)
    fillet3_piece_26a = fillet3_piece_26a & Plane(origin=(0, -4, -18.574175621), x_dir=(0, 0.21052631578947353, 0.9775881905793006), z_dir=(1, 0, 0)) * Cylinder(4, 70, mode=Mode.PRIVATE)
    fillet3_piece_26a = split(fillet3_piece_26a, bisect_by=Plane(origin=(0, -2.5, 0), z_dir=(0, 1, 0)), keep=Keep.TOP, mode=Mode.PRIVATE)
    with BuildSketch(Plane(origin=(0, -2.5, -44), x_dir=(0, 1, 0), z_dir=(0, 0, 1))) as fillet3_piece_26b_section:
        with BuildLine():
            CenterArc((FILLET3_R, -FILLET3_R), FILLET3_R, 90, 90)
            Line((0, -FILLET3_R), (0, 0))
            Line((0, 0), (FILLET3_R, 0))
        make_face()
    fillet3_piece_26b = extrude(amount=29.179491924, mode=Mode.PRIVATE)
    fillet3_piece_26b = fillet3_piece_26b & Plane(origin=(0, -4, -18.574175621), x_dir=(0, 0.21052631578947353, 0.9775881905793006), z_dir=(1, 0, 0)) * Cylinder(4, 63, mode=Mode.PRIVATE)
    fillet3_piece_26b = fillet3_piece_26b & Plane(origin=(0, 0, 0), x_dir=(0, -0.14285714285714307, -0.989743318610787), z_dir=(-1, 0, 0)) * Cylinder(17.5, 63, mode=Mode.PRIVATE)
    fillet3_piece_26 = fillet3_piece_26a & fillet3_piece_26b
    add(fillet3_piece_26, mode=Mode.SUBTRACT)


solid = part.part
